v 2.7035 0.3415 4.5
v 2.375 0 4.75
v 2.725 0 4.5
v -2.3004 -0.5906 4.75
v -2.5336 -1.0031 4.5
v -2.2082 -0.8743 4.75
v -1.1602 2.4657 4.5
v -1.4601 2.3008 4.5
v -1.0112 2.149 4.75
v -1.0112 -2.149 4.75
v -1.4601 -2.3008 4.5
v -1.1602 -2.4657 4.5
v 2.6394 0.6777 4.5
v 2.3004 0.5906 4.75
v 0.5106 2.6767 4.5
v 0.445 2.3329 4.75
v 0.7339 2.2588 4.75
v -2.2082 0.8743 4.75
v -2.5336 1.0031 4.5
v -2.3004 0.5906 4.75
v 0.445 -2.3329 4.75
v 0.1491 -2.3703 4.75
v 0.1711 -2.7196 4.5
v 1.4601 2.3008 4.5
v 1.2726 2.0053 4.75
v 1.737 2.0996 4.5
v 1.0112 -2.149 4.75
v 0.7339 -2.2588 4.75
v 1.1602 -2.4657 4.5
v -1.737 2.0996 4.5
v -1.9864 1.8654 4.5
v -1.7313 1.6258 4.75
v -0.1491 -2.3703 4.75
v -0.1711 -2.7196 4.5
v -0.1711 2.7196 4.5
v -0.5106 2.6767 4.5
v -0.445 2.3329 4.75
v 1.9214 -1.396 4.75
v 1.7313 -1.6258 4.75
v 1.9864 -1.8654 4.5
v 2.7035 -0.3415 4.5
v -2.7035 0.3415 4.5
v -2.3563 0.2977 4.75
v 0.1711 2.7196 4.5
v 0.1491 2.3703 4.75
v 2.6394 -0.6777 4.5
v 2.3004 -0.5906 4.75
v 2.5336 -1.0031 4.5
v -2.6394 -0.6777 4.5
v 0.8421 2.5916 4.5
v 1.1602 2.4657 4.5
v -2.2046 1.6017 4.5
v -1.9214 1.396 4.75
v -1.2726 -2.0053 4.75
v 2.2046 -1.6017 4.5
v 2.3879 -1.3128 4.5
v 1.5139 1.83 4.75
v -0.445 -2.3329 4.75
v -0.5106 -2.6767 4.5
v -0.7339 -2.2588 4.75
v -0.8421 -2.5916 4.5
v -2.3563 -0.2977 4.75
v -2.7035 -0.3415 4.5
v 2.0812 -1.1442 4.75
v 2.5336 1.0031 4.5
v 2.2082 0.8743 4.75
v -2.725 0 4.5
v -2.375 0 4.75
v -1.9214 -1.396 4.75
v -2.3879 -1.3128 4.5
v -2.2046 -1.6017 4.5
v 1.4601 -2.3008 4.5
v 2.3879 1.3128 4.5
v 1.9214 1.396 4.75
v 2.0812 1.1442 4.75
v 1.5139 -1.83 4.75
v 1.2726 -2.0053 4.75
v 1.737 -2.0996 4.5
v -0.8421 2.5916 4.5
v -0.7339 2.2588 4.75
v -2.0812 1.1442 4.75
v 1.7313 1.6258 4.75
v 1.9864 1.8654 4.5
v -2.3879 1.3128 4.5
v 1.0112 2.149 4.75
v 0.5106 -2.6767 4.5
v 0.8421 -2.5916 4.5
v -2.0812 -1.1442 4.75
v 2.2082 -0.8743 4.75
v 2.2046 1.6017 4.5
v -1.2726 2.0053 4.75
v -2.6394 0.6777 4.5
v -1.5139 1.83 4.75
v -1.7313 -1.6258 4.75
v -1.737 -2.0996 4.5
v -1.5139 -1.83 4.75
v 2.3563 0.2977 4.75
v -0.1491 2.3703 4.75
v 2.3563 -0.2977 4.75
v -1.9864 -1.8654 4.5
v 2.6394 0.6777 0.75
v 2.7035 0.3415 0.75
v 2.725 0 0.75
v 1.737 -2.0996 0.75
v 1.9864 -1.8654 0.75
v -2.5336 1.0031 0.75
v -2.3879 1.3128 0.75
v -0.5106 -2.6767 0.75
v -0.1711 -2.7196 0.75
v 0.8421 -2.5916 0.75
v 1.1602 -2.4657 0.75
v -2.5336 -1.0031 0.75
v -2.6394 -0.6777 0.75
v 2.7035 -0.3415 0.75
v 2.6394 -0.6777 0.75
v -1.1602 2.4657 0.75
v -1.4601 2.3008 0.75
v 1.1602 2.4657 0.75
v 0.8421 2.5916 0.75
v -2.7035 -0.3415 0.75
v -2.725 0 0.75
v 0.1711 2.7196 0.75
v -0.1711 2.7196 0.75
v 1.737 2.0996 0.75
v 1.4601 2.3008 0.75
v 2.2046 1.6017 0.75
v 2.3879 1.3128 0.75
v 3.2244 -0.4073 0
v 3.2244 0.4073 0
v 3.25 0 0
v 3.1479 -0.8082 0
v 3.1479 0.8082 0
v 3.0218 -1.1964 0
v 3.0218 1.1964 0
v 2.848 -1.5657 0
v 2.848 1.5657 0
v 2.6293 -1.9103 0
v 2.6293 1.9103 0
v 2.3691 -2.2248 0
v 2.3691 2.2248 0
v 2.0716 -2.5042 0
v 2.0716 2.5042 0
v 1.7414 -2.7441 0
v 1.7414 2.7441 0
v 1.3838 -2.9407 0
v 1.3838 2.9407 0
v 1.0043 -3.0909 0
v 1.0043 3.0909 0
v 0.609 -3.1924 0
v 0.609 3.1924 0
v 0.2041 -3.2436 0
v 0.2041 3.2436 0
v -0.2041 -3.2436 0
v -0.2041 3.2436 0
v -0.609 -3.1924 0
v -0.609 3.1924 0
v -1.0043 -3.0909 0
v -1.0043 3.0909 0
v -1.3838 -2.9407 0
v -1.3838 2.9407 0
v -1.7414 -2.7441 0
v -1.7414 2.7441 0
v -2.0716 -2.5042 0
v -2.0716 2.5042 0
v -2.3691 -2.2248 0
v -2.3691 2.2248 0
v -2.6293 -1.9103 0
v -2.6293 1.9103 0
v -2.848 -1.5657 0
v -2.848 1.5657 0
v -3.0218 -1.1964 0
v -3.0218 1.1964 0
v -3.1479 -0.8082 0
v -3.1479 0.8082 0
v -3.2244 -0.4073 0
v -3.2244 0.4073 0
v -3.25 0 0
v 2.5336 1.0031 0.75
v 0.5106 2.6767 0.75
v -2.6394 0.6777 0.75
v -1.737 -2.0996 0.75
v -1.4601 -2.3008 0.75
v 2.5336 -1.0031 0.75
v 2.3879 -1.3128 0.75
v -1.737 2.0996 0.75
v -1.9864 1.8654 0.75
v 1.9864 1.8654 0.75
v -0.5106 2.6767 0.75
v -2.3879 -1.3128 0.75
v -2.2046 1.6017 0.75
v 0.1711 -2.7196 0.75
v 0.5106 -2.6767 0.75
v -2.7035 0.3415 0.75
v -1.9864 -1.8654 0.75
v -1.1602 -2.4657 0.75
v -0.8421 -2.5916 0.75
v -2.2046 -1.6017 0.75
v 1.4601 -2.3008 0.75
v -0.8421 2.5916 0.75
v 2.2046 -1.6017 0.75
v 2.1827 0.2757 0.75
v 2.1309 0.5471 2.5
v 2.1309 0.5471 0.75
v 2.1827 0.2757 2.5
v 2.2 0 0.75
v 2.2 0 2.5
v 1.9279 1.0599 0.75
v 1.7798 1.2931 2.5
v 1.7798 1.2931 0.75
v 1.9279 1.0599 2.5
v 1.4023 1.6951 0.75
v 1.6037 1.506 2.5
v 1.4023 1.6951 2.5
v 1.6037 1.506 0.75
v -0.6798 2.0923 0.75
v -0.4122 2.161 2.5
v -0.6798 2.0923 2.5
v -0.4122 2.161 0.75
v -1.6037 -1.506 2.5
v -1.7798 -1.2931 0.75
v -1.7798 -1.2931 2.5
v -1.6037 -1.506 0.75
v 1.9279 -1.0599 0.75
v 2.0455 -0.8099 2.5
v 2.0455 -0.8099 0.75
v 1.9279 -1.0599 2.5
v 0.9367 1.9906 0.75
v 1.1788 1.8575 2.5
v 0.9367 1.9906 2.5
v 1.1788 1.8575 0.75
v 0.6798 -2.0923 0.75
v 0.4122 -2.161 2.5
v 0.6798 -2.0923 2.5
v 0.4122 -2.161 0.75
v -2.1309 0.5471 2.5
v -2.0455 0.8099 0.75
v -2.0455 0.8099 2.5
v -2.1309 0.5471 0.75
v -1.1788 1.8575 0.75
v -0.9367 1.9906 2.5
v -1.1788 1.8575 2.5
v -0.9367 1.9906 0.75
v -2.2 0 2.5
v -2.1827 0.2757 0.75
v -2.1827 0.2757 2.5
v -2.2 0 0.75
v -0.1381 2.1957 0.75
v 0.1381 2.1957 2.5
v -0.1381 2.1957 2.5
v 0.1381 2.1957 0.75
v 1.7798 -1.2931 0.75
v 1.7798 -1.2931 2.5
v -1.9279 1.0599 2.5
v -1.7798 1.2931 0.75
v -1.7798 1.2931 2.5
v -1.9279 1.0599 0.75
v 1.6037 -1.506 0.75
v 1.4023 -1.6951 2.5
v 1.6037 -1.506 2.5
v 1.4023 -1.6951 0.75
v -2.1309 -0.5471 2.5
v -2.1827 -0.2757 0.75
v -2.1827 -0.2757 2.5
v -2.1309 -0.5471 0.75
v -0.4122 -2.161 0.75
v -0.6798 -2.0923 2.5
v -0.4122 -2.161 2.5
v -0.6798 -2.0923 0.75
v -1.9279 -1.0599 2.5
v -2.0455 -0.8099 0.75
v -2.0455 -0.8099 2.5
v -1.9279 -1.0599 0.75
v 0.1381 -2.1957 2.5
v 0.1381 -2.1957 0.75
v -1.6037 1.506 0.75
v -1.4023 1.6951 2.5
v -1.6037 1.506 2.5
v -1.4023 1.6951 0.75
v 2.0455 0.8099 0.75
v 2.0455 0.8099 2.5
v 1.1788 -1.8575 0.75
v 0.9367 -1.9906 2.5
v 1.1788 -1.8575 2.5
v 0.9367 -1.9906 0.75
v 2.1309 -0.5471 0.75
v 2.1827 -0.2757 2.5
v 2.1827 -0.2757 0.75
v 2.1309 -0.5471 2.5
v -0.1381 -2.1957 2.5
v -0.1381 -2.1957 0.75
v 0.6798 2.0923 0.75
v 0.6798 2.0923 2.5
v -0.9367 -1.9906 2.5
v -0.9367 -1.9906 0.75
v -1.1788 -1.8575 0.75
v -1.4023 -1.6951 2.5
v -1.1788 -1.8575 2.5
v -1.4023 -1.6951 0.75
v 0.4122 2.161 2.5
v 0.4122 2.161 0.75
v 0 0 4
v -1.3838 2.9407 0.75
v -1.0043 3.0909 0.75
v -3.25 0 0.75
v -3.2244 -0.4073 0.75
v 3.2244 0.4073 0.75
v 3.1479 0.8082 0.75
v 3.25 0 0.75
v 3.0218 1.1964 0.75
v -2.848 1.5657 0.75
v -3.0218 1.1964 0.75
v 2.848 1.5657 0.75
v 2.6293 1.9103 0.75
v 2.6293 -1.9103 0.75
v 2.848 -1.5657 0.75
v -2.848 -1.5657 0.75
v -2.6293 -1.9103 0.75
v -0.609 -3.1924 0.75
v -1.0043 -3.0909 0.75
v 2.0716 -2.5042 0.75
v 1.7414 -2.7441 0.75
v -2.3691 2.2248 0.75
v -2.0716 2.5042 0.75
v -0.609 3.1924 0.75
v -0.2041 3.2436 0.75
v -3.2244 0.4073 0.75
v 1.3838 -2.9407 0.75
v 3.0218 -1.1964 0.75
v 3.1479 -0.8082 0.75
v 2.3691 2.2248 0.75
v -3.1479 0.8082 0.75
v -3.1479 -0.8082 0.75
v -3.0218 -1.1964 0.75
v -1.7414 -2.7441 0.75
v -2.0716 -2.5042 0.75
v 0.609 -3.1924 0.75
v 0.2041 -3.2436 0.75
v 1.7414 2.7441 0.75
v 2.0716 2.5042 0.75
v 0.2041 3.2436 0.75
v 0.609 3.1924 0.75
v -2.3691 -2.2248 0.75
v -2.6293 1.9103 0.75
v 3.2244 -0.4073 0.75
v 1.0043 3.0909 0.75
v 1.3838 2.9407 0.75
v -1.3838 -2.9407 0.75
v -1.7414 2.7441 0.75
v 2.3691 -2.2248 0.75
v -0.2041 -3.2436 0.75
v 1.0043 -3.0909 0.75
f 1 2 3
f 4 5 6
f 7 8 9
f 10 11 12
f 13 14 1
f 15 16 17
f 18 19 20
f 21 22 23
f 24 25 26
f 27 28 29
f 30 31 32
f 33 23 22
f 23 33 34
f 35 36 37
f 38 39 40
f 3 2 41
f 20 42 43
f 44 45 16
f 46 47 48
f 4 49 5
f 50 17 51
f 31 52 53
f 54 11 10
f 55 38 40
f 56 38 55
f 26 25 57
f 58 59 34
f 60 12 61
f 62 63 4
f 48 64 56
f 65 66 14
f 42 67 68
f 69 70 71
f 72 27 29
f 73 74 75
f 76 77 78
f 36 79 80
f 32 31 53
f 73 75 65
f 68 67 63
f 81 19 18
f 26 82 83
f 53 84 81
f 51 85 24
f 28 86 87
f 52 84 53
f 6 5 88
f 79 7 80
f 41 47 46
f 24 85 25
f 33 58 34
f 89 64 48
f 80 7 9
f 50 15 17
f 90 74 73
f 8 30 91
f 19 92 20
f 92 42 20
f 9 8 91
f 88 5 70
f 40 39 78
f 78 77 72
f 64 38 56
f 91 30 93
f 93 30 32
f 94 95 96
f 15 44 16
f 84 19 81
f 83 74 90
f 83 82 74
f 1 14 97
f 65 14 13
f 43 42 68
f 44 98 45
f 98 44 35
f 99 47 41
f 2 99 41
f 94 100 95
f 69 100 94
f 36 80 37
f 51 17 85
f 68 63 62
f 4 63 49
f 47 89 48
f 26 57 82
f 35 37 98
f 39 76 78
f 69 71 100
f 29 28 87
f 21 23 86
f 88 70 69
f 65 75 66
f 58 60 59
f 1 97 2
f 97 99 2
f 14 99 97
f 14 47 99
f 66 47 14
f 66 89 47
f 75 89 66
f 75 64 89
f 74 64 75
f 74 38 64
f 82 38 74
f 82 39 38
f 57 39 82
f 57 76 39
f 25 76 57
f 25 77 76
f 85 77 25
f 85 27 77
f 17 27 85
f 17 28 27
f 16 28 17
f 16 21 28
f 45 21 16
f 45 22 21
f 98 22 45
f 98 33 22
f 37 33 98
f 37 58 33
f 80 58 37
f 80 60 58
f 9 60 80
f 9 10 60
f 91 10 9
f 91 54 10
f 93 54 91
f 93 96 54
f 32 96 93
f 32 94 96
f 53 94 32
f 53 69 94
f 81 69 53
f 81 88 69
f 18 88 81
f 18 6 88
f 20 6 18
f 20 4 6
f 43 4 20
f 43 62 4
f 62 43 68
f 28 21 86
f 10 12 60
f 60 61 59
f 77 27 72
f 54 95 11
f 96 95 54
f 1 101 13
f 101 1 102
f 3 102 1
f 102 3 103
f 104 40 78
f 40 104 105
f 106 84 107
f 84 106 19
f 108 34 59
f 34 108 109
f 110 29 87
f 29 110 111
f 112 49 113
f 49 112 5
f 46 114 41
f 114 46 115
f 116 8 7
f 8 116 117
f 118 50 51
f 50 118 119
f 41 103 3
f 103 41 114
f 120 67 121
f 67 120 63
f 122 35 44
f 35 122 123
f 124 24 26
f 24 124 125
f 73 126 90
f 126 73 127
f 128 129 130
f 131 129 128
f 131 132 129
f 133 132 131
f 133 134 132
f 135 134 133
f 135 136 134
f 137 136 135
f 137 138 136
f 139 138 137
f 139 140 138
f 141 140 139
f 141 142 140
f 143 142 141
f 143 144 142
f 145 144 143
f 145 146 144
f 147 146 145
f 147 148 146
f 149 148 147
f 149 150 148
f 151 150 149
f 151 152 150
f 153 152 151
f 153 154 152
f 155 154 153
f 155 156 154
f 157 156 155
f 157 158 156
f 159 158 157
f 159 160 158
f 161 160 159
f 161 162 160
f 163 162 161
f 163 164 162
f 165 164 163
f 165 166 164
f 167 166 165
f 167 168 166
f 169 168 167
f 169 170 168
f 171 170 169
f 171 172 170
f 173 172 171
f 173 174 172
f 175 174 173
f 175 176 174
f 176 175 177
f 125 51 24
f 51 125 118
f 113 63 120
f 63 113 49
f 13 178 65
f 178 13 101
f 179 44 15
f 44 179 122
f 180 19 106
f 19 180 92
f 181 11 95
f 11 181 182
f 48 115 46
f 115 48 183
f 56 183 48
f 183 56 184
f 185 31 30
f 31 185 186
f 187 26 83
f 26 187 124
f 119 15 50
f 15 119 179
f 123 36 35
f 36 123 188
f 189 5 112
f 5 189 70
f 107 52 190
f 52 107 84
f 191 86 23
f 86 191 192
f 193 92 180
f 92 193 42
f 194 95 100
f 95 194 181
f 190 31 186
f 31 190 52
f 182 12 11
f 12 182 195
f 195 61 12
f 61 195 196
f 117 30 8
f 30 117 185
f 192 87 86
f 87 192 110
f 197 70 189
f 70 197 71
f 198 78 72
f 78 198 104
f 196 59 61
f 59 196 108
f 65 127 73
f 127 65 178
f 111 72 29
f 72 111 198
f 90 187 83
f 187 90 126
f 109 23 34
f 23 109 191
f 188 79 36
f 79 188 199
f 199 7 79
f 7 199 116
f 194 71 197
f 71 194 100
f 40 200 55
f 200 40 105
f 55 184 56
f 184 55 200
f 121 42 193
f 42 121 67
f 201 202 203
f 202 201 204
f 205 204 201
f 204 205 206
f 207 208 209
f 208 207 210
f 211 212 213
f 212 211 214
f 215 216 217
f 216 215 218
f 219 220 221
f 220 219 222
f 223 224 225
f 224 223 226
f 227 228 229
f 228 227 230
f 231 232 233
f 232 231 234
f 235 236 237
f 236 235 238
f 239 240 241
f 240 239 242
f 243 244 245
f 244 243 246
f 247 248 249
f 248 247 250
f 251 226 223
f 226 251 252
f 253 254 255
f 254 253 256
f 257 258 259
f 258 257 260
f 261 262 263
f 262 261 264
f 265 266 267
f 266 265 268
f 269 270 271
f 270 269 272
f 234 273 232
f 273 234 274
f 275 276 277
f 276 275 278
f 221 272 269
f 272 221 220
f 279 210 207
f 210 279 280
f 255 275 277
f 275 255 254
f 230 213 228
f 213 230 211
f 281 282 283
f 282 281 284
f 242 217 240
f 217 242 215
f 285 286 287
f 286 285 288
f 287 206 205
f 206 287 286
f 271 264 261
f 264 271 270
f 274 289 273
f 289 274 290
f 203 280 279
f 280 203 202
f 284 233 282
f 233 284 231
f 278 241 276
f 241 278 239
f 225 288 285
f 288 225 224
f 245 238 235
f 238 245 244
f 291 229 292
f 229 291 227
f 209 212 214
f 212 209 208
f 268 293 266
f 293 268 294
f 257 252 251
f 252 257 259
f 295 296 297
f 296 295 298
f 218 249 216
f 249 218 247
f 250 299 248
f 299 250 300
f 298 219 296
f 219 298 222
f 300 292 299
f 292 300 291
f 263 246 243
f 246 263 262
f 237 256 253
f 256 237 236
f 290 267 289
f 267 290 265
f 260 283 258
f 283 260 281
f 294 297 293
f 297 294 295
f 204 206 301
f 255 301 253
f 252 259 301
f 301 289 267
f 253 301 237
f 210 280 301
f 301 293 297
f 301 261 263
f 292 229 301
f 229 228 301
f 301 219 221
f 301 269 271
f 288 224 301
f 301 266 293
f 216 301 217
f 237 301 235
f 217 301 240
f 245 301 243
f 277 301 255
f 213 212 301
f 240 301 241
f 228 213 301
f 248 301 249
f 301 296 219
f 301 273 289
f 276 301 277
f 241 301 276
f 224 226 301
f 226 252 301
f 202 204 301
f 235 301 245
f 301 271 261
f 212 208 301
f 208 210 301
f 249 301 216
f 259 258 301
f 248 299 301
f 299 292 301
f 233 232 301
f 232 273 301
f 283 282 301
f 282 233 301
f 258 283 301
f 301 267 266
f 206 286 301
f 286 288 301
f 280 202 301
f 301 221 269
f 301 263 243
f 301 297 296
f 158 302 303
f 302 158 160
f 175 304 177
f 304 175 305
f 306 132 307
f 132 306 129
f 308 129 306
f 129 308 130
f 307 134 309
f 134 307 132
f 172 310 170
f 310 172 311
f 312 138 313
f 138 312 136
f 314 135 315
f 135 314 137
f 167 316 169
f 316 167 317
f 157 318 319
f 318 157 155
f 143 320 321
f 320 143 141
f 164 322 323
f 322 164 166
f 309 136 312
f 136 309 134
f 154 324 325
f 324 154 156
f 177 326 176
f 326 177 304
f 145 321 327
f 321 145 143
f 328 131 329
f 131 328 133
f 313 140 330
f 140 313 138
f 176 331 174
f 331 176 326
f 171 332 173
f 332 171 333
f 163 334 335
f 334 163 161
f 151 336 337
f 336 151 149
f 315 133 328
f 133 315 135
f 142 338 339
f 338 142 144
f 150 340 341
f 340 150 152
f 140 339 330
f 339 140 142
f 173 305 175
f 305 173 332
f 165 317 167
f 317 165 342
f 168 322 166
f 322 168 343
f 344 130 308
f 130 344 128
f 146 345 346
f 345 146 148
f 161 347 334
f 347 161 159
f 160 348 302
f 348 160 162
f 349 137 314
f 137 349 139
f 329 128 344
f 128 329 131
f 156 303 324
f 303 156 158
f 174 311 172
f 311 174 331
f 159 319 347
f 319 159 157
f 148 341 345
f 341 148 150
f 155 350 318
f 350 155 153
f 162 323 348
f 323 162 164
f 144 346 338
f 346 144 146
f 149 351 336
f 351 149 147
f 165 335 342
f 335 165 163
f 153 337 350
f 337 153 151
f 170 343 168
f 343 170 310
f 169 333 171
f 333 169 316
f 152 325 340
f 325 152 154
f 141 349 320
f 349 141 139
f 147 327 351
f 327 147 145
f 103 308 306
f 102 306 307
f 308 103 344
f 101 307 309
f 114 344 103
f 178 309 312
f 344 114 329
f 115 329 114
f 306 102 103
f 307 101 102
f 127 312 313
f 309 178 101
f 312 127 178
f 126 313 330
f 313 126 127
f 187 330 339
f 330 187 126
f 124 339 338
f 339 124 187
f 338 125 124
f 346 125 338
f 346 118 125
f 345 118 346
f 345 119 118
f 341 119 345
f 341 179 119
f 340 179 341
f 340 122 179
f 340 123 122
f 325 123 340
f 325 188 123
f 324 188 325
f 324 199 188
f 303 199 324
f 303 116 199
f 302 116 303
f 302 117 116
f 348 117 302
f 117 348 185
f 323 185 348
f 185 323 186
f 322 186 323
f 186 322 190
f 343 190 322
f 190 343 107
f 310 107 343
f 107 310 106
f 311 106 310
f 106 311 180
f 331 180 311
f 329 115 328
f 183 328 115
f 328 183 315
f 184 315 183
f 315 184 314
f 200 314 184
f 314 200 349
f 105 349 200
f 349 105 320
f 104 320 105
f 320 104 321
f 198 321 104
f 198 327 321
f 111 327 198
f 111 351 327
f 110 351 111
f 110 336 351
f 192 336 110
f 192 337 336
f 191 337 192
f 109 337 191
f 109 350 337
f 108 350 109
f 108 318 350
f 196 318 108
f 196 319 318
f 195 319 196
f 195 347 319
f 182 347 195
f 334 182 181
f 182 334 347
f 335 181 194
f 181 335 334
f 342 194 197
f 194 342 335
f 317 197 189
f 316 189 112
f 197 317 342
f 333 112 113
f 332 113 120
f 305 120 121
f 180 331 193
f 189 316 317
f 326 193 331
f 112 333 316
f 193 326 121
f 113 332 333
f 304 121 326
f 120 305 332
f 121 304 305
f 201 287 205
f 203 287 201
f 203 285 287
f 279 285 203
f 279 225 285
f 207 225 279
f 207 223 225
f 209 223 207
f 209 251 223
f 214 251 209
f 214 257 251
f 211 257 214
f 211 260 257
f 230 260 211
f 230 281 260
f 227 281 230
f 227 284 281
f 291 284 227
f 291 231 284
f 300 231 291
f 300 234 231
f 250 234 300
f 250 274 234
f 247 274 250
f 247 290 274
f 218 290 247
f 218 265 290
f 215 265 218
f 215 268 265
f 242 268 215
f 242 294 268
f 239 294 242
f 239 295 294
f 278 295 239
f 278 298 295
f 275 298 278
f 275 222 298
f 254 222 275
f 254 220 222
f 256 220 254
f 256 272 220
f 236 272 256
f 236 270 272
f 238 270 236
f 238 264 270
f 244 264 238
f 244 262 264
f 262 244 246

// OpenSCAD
difference() {
  union() {
    translate([0,0,4.5]) cylinder(d1=5.45,d2=4.75,h=0.25);
    cylinder(d=5.45,h=4.5);
  }
  translate([0,0,0.5]) cylinder(d=4.4,h=2);
  translate([0,0,2.5]) cylinder(d1=4.4,d2=0,h=1.5);
}
//translate([0,0,0.5]) { cube([6,6,1], true); }
cylinder(d=6.5,h=0.75);

$fn=50;
